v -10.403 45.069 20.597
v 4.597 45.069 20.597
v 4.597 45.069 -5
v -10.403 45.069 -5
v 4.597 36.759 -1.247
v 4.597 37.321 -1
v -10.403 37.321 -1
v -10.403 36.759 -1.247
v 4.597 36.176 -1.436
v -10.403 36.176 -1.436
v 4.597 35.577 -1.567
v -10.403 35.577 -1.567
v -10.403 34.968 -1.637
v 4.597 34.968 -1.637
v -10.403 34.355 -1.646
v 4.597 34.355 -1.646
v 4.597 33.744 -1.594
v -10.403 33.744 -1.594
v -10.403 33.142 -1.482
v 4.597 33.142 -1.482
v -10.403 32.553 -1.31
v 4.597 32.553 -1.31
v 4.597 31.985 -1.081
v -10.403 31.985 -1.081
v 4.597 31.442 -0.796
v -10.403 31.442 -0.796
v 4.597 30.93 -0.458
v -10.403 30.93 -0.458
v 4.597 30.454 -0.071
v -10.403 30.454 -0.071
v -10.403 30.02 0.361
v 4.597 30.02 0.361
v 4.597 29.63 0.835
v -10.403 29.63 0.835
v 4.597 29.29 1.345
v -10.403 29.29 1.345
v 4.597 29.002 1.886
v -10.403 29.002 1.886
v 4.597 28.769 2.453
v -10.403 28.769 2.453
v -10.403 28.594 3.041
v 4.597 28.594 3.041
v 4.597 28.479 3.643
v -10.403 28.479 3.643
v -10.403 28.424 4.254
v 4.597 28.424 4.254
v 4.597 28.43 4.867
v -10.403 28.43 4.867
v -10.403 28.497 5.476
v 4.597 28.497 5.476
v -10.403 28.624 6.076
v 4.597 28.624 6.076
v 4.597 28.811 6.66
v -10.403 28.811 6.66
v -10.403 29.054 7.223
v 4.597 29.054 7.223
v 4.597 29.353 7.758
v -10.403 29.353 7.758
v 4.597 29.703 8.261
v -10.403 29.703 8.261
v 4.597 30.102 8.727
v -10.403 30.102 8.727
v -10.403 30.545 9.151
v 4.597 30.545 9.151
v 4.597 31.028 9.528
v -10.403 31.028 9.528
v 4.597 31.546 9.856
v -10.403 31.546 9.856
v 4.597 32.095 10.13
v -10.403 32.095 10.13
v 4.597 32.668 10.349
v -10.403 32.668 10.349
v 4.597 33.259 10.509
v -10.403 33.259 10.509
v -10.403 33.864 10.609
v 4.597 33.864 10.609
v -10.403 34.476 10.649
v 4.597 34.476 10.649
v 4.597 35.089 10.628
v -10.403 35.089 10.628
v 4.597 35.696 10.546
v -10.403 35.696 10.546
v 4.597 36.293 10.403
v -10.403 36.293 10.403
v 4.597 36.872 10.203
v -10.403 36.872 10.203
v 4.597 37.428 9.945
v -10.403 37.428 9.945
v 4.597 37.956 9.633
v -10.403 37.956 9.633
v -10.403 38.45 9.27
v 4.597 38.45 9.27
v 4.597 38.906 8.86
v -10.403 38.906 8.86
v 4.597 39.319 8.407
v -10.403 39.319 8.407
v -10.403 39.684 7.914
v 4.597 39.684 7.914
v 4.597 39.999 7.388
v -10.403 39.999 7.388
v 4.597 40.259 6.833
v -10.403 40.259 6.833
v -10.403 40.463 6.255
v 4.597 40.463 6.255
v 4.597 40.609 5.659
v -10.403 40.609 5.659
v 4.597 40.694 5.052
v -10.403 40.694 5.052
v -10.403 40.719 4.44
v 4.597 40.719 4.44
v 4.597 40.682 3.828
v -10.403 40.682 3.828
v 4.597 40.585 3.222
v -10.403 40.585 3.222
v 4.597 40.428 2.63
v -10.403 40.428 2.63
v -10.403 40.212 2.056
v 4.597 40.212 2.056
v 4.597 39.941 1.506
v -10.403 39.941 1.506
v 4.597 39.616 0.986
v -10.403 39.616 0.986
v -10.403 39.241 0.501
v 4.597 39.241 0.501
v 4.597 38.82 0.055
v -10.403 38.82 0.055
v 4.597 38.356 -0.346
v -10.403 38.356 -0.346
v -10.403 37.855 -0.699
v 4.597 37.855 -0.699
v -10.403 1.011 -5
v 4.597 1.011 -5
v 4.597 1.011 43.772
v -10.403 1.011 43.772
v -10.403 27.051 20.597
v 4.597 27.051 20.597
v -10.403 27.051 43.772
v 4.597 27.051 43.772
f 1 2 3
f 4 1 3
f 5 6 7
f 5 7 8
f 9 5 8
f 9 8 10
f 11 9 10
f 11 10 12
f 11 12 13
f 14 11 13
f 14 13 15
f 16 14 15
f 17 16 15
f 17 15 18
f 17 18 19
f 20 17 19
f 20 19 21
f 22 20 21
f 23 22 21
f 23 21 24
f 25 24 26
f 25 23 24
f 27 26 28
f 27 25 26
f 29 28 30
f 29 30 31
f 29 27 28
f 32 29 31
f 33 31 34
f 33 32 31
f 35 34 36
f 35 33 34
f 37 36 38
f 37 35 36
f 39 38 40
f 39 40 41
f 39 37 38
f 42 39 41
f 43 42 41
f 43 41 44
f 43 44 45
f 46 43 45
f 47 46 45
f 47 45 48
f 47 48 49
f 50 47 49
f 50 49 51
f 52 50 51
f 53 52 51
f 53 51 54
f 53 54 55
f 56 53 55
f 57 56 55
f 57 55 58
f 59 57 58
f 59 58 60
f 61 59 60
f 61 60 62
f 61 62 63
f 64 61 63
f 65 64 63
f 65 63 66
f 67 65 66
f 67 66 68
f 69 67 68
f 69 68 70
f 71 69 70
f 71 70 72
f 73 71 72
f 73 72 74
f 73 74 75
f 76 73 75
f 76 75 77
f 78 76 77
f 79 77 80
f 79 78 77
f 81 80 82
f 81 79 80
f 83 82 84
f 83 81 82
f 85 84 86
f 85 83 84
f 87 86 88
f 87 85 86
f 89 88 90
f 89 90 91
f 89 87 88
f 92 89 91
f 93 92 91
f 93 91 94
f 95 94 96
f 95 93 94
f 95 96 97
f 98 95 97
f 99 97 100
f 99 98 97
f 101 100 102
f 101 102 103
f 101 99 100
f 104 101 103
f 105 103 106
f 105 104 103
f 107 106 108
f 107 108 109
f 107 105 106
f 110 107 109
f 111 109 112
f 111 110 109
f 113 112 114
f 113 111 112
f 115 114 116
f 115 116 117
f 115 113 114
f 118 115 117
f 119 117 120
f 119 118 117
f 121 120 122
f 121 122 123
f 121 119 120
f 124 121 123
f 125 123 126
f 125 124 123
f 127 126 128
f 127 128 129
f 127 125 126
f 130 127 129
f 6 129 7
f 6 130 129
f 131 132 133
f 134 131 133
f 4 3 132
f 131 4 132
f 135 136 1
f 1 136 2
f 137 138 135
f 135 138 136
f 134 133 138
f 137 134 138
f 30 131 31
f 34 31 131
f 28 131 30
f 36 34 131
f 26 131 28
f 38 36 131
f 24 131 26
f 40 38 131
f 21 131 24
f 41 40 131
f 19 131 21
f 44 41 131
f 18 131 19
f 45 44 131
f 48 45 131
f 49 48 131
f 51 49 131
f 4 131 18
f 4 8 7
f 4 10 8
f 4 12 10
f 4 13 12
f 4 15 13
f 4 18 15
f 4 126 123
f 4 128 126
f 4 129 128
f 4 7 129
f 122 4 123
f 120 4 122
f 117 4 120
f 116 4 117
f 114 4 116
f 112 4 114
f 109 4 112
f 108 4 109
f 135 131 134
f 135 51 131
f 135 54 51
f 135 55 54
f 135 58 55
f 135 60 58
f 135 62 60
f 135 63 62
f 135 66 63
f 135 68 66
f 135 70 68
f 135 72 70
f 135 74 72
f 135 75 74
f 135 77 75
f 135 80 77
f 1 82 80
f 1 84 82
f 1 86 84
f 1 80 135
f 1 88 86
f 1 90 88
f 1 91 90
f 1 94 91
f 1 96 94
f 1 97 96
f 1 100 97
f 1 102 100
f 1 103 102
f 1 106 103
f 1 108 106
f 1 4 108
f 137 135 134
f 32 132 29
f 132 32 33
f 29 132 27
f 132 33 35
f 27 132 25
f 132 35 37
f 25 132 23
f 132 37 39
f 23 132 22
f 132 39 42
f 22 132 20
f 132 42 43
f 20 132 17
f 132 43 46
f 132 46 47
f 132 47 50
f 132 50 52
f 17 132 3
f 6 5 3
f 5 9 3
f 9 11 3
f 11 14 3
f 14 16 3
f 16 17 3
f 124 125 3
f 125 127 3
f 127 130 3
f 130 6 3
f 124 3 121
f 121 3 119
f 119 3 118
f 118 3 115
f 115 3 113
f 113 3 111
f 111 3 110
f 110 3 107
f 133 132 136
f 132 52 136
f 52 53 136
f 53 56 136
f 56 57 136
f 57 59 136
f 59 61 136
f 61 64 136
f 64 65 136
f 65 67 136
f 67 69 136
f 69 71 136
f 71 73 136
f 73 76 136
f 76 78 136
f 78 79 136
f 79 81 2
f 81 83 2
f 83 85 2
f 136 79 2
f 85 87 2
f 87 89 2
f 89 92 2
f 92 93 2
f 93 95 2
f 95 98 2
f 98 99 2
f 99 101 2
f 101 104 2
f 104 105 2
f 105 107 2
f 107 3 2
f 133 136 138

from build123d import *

# Parameters (mm, degrees)
SKETCH1_W            = 42.5
SKETCH1_H            = 55.85
BOSS_EXTRUDE2_DEPTH  = 42.5
SKETCH5_R            = 3
CUT_EXTRUDE2_DEPTH   = 42.5
SKETCH6_W            = 42.5
SKETCH6_H            = 42.5
CUT_EXTRUDE3_DEPTH   = 39.5
SKETCH7_R            = 12
SKETCH7_R_2          = 1.5
CUT_EXTRUDE4_DEPTH   = 39.5
SKETCH9_W            = 10
SKETCH9_H            = 42.5
CUT_EXTRUDE5_DEPTH   = 39.5
CHAMFER1_SIZE        = 3
CHAMFER2_SIZE        = 2
SKETCH10_W           = 2
SKETCH10_H           = 2.21509362
BOSS_EXTRUDE3_DEPTH  = 3
SKETCH12_W           = 2
SKETCH12_H           = 3
BOSS_EXTRUDE4_DEPTH  = 3
BOSS_EXTRUDE5_DEPTH  = 2
BOSS_EXTRUDE6_DEPTH  = 2
SKETCH16_W           = 9
SKETCH16_H           = 9
SKETCH16_R           = 3.175
BOSS_EXTRUDE8_DEPTH  = 5
SKETCH17_R           = 3
CUT_EXTRUDE6_DEPTH   = 5
SKETCH18_W           = 9
SKETCH18_H           = 7.183282928
BOSS_EXTRUDE9_DEPTH  = 2
SKETCH19_R           = 3.175
CUT_EXTRUDE7_DEPTH   = 5
SKETCH20_W           = 36.5
SKETCH20_H           = 45.349147475
CUT_EXTRUDE9_DEPTH   = 66
CUT_EXTRUDE10_DEPTH  = 66
SKETCH22_R           = 12
SKETCH22_R_2         = 11.45
SKETCH22_R_3         = 1.5
SKETCH22_R_4         = 1.55
BOSS_EXTRUDE13_DEPTH = 3
SKETCH23_W           = 42.5
SKETCH23_H           = 7.46509362
CUT_EXTRUDE11_DEPTH  = 3
CHAMFER3_SIZE        = 2
SKETCH24_R           = 13.75
SKETCH24_R_2         = 11.45
BOSS_EXTRUDE14_DEPTH = 4
BOSS_EXTRUDE15_START = 10
SKETCH25_W           = 42.5
SKETCH25_H           = 33.508189308
SKETCH25_R           = 3.175
BOSS_EXTRUDE15_DEPTH = 10
CUT_EXTRUDE12_DEPTH  = 142
CHAMFER4_SIZE        = 10
SKETCH27_W           = 1.831902159
SKETCH27_H           = 1.026975453
BOSS_EXTRUDE16_DEPTH = 0.2
SKETCH28_R           = 3.175
BOSS_EXTRUDE17_DEPTH = 10
SKETCH29_R           = 6.15
BOSS_EXTRUDE19_DEPTH = 15
CUT_EXTRUDE13_DEPTH  = 50


with BuildPart() as part:
    # Sketch1 → Boss-Extrude2 (new body)
    with BuildSketch(Plane.XY):
        with Locations((-16.653499003, 3.960644895)):
            Rectangle(SKETCH1_W, SKETCH1_H)
    extrude(amount=BOSS_EXTRUDE2_DEPTH)

    # Sketch5 → Cut-Extrude2 (cut)
    with BuildSketch(Plane.XY.offset(42.5)):
        with Locations((-31.903499003, 25.965832134)):
            Circle(SKETCH5_R)
        with Locations(Location((-1.403499003, 25.965832134, 0), (0, 0, 180))):
            Circle(SKETCH5_R)
    extrude(amount=-CUT_EXTRUDE2_DEPTH, mode=Mode.SUBTRACT)

    # Sketch6 → Cut-Extrude3 (cut)
    with BuildSketch(Plane.ZY.offset(37.903499003)):
        with Locations((21.25, -0.499261485)):
            Rectangle(SKETCH6_W, SKETCH6_H)
    extrude(amount=-CUT_EXTRUDE3_DEPTH, mode=Mode.SUBTRACT)

    # Sketch7 → Cut-Extrude4 (cut)
    with BuildSketch(Plane(origin=(4.596500997, 0, 0), x_dir=(0, 0, -1), z_dir=(1, 0, 0))):
        with Locations((-21.25, -0.499261485)):
            Circle(SKETCH7_R)
        with Locations((-37, -16.249261485)):
            Circle(SKETCH7_R_2)
        with Locations((-5.5, -16.249261485)):
            Circle(SKETCH7_R_2)
        with Locations((-37, 14.750738515)):
            Circle(SKETCH7_R_2)
        with Locations((-5.5, 14.750738515)):
            Circle(SKETCH7_R_2)
    extrude(amount=-CUT_EXTRUDE4_DEPTH, mode=Mode.SUBTRACT)

    # Sketch9 → Cut-Extrude5 (cut)
    with BuildSketch(Plane.XZ.offset(23.964355105)):
        with Locations((-32.903499003, 21.25)):
            Rectangle(SKETCH9_W, SKETCH9_H)
    extrude(amount=-CUT_EXTRUDE5_DEPTH, mode=Mode.SUBTRACT)

    # Chamfer1
    chamfer1_edges = [part.edges().sort_by_distance(p)[0] for p in [
        (-37.903499003, 20.750738515, 21.25),
        (-37.903499003, 31.885644895, 21.25),
    ]]
    chamfer(chamfer1_edges, length=CHAMFER1_SIZE)

    # Chamfer2
    chamfer2_edges = [part.edges().sort_by_distance(p)[0] for p in [
        (4.596500997, -23.964355105, 21.25),
    ]]
    chamfer(chamfer2_edges, length=CHAMFER2_SIZE)

    # Sketch10 → Boss-Extrude3 (add)
    with BuildSketch(Plane.ZY.offset(27.903499003)):
        with Locations((43.5, -22.856808295)):
            Rectangle(SKETCH10_W, SKETCH10_H)
        with Locations((-1, -22.856808295)):
            Rectangle(SKETCH10_W, SKETCH10_H)
    extrude(amount=-BOSS_EXTRUDE3_DEPTH)

    # Sketch12 → Boss-Extrude4 (add)
    with BuildSketch(Plane.ZY.offset(-1.596500997)):
        with Locations((43.5, 19.250738515)):
            Rectangle(SKETCH12_W, SKETCH12_H)
        with Locations((-1, 19.250738515)):
            Rectangle(SKETCH12_W, SKETCH12_H)
    extrude(amount=-BOSS_EXTRUDE4_DEPTH)

    # Sketch13 → Boss-Extrude5 (add)
    with BuildSketch(Plane(origin=(0, 0, -2), x_dir=(-1, 0, 0), z_dir=(0, 0, -1))):
        Polygon((-1.596500997, 17.750738515), (24.903499003, -21.749261485), (27.903499003, -21.749261485), (-1.596500997, 20.750738515), align=None)
    extrude(amount=-BOSS_EXTRUDE5_DEPTH)

    # Sketch14 → Boss-Extrude6 (add)
    with BuildSketch(Plane.XY.offset(44.5)):
        Polygon((1.596500997, 17.750738515), (-24.903499003, -21.749261485), (-27.903499003, -21.749261485), (1.596500997, 20.750738515), align=None)
    extrude(amount=-BOSS_EXTRUDE6_DEPTH)

    # Sketch16 → Boss-Extrude8 (add)
    # profile 1 of 2: a face of its own
    with BuildSketch(Plane(origin=(4.596500997, 0, 0), x_dir=(0, 0, -1), z_dir=(1, 0, 0))):
        with Locations((-38, 34.568927823)):
            Rectangle(SKETCH16_W, SKETCH16_H)
        with Locations((-38, 34.568927823)):
            Circle(SKETCH16_R, mode=Mode.SUBTRACT)
    # profile 2 of 2: a face of its own
    with BuildSketch(Plane(origin=(4.596500997, 0, 0), x_dir=(0, 0, -1), z_dir=(1, 0, 0))):
        with Locations((-4.5, 34.568927823)):
            Rectangle(SKETCH16_W, SKETCH16_H)
        with Locations((-4.5, 34.568927823)):
            Circle(SKETCH16_R, mode=Mode.SUBTRACT)
    extrude(amount=-BOSS_EXTRUDE8_DEPTH)

    # Sketch17 → Cut-Extrude6 (cut)
    with BuildSketch(Plane(origin=(4.596500997, 0, 0), x_dir=(0, 0, -1), z_dir=(1, 0, 0))):
        with Locations((-38, 34.568927823)):
            Circle(SKETCH17_R)
        with Locations((-4.5, 34.568927823)):
            Circle(SKETCH17_R)
    extrude(amount=-CUT_EXTRUDE6_DEPTH, mode=Mode.SUBTRACT)

    # Sketch18 → Boss-Extrude9 (add)
    with BuildSketch(Plane.ZY.offset(0.403499003)):
        with Locations((4.5, 35.477286359)):
            Rectangle(SKETCH18_W, SKETCH18_H)
        with Locations((38, 35.477286359)):
            Rectangle(SKETCH18_W, SKETCH18_H)
    extrude(amount=BOSS_EXTRUDE9_DEPTH)

    # Sketch19 → Cut-Extrude7 (cut)
    with BuildSketch(Plane(origin=(4.596500997, 0, 0), x_dir=(0, 0, -1), z_dir=(1, 0, 0))):
        with Locations((-38, 34.568927823)):
            Circle(SKETCH19_R)
        with Locations(Location((-4.5, 34.568927823, 0), (0, 0, 180))):
            Circle(SKETCH19_R)
    extrude(amount=-CUT_EXTRUDE7_DEPTH, mode=Mode.SUBTRACT)

    # Sketch20 → Cut-Extrude9 (cut, symmetric)
    with BuildSketch(Plane.XY.offset(42.5)):
        with Locations((-16.653499003, -1.923835222)):
            Rectangle(SKETCH20_W, SKETCH20_H)
    extrude(amount=CUT_EXTRUDE9_DEPTH, both=True, mode=Mode.SUBTRACT)

    # Sketch21 → Cut-Extrude10 (cut, symmetric)
    with BuildSketch(Plane(origin=(4.596500997, 0, 0), x_dir=(0, 0, -1), z_dir=(1, 0, 0))):
        Polygon((0, 39.068927823), (0, -21.964355105), (2.461652374, -21.964355105), (3.037977258, 39.068927823), (0.568013469, 39.068927823), align=None)
        Polygon((-42.5, 39.068927823), (-42.5, -21.964355105), (-44.961652374, -21.964355105), (-45.537977258, 39.068927823), (-43.068013469, 39.068927823), align=None)
    extrude(amount=CUT_EXTRUDE10_DEPTH, both=True, mode=Mode.SUBTRACT)

    # Sketch22 → Boss-Extrude13 (add)
    # profile 1 of 5: a face of its own
    with BuildSketch(Plane(origin=(4.596500997, 0, 0), x_dir=(0, 0, -1), z_dir=(1, 0, 0))):
        with Locations((-21.25, -0.499261485)):
            Circle(SKETCH22_R)
        with Locations((-21.25, -0.499261485)):
            Circle(SKETCH22_R_2, mode=Mode.SUBTRACT)
    # profile 2 of 5: a face of its own
    with BuildSketch(Plane(origin=(4.596500997, 0, 0), x_dir=(0, 0, -1), z_dir=(1, 0, 0))):
        with Locations((-37, 14.750738515)):
            Circle(SKETCH22_R_3)
    # profile 3 of 5: a face of its own
    with BuildSketch(Plane(origin=(4.596500997, 0, 0), x_dir=(0, 0, -1), z_dir=(1, 0, 0))):
        with Locations((-5.524563877, 14.750738515)):
            Circle(SKETCH22_R_4)
    # profile 4 of 5: a face of its own
    with BuildSketch(Plane(origin=(4.596500997, 0, 0), x_dir=(0, 0, -1), z_dir=(1, 0, 0))):
        with Locations((-5.5, -16.249261485)):
            Circle(SKETCH22_R_3)
    # profile 5 of 5: a face of its own
    with BuildSketch(Plane(origin=(4.596500997, 0, 0), x_dir=(0, 0, -1), z_dir=(1, 0, 0))):
        with Locations((-37, -16.249261485)):
            Circle(SKETCH22_R_3)
    extrude(amount=-BOSS_EXTRUDE13_DEPTH)

    # Sketch23 → Cut-Extrude11 (cut)
    with BuildSketch(Plane(origin=(4.596500997, 0, 0), x_dir=(0, 0, -1), z_dir=(1, 0, 0))):
        with Locations((-21.25, -20.231808295)):
            Rectangle(SKETCH23_W, SKETCH23_H)
    extrude(amount=-CUT_EXTRUDE11_DEPTH, mode=Mode.SUBTRACT)

    # Chamfer3
    chamfer3_edges = [part.edges().sort_by_distance(p)[0] for p in [
        (4.596500997, -16.499261485, 21.25),
    ]]
    chamfer(chamfer3_edges, length=CHAMFER3_SIZE)

    # Sketch24 → Boss-Extrude14 (add)
    with BuildSketch(Plane.ZY.offset(-1.596500997)):
        with Locations(Location((21.25, -0.499261485, 0), (0, 0, 180))):
            Circle(SKETCH24_R)
        with Locations(Location((21.25, -0.499261485, 0), (0, 0, 180))):
            Circle(SKETCH24_R_2, mode=Mode.SUBTRACT)
    extrude(amount=BOSS_EXTRUDE14_DEPTH)

    # Sketch25 → Boss-Extrude15 (add)
    with BuildSketch(Plane(origin=(4.596500997, 0, 0), x_dir=(0, 0, -1), z_dir=(1, 0, 0)).offset(BOSS_EXTRUDE15_START)):
        with Locations((-21.25, 22.314833169)):
            Rectangle(SKETCH25_W, SKETCH25_H)
        with Locations((-38, 34.568927823)):
            Circle(SKETCH25_R, mode=Mode.SUBTRACT)
        with Locations((-4.5, 34.568927823)):
            Circle(SKETCH25_R, mode=Mode.SUBTRACT)
    extrude(amount=-BOSS_EXTRUDE15_DEPTH)

    # Sketch26 → Cut-Extrude12 (cut)
    with BuildSketch(Plane(origin=(0, 0, 0), x_dir=(-1, 0, 0), z_dir=(0, 0, -1))):
        Polygon((-4.596500997, 39.068927823), (-4.596500997, -17.856619688), (37.419914356, -17.856619688), (42.573197426, 39.068927823), align=None)
    extrude(amount=-CUT_EXTRUDE12_DEPTH, mode=Mode.SUBTRACT)

    # Chamfer4
    chamfer4_edges = [part.edges().sort_by_distance(p)[0] for p in [
        (9.596500997, 5.560738515, 42.5),
        (9.596500997, 5.560738515, 0),
    ]]
    chamfer(chamfer4_edges, length=CHAMFER4_SIZE)

    # Sketch27 → Boss-Extrude16 (add)
    with BuildSketch(Plane.XZ.offset(-5.560738515)):
        with Locations((11.95576893, 21.763487727)):
            Rectangle(SKETCH27_W, SKETCH27_H)
    extrude(amount=BOSS_EXTRUDE16_DEPTH)

    # Sketch28 → Boss-Extrude17 (add)
    with BuildSketch(Plane(origin=(14.596500997, 0, 0), x_dir=(0, 0, -1), z_dir=(1, 0, 0))):
        Polygon((-42.578884897, 40.068927823), (0, 40.068927823), (1, 40.068927823), (1, 15.146524953), (-8.635786438, 5.510738515), (-33.864213562, 5.510738515), (-43.5, 15.146524953), (-43.5, 40.068927823), align=None)
        with Locations((-38, 34.568927823)):
            Circle(SKETCH28_R, mode=Mode.SUBTRACT)
        with Locations((-4.5, 34.568927823)):
            Circle(SKETCH28_R, mode=Mode.SUBTRACT)
    extrude(amount=-BOSS_EXTRUDE17_DEPTH)

    # Sketch29 → Boss-Extrude19 (add)
    with BuildSketch(Plane.ZY.offset(-4.596500997)):
        Polygon((-5, 45.068927823), (-5, 1.010738515), (43.772310913, 1.010738515), (43.772310913, 27.051079093), (20.597179394, 27.051079093), (20.597179394, 45.068927823), align=None)
        with Locations(Location((4.5, 34.568927823, 0), (0, 0, 153.419803228))):
            Circle(SKETCH29_R, mode=Mode.SUBTRACT)
    extrude(amount=BOSS_EXTRUDE19_DEPTH)

    # Sketch30 → Cut-Extrude13 (cut)
    with BuildSketch(Plane.XY.offset(43.772310913)):
        Polygon((4.596500997, 40.068927823), (4.596500997, 5.510738515), (14.596500997, 4.365687142), (14.596500997, 40.068927823), align=None)
    extrude(amount=-CUT_EXTRUDE13_DEPTH, mode=Mode.SUBTRACT)


solid = part.part
